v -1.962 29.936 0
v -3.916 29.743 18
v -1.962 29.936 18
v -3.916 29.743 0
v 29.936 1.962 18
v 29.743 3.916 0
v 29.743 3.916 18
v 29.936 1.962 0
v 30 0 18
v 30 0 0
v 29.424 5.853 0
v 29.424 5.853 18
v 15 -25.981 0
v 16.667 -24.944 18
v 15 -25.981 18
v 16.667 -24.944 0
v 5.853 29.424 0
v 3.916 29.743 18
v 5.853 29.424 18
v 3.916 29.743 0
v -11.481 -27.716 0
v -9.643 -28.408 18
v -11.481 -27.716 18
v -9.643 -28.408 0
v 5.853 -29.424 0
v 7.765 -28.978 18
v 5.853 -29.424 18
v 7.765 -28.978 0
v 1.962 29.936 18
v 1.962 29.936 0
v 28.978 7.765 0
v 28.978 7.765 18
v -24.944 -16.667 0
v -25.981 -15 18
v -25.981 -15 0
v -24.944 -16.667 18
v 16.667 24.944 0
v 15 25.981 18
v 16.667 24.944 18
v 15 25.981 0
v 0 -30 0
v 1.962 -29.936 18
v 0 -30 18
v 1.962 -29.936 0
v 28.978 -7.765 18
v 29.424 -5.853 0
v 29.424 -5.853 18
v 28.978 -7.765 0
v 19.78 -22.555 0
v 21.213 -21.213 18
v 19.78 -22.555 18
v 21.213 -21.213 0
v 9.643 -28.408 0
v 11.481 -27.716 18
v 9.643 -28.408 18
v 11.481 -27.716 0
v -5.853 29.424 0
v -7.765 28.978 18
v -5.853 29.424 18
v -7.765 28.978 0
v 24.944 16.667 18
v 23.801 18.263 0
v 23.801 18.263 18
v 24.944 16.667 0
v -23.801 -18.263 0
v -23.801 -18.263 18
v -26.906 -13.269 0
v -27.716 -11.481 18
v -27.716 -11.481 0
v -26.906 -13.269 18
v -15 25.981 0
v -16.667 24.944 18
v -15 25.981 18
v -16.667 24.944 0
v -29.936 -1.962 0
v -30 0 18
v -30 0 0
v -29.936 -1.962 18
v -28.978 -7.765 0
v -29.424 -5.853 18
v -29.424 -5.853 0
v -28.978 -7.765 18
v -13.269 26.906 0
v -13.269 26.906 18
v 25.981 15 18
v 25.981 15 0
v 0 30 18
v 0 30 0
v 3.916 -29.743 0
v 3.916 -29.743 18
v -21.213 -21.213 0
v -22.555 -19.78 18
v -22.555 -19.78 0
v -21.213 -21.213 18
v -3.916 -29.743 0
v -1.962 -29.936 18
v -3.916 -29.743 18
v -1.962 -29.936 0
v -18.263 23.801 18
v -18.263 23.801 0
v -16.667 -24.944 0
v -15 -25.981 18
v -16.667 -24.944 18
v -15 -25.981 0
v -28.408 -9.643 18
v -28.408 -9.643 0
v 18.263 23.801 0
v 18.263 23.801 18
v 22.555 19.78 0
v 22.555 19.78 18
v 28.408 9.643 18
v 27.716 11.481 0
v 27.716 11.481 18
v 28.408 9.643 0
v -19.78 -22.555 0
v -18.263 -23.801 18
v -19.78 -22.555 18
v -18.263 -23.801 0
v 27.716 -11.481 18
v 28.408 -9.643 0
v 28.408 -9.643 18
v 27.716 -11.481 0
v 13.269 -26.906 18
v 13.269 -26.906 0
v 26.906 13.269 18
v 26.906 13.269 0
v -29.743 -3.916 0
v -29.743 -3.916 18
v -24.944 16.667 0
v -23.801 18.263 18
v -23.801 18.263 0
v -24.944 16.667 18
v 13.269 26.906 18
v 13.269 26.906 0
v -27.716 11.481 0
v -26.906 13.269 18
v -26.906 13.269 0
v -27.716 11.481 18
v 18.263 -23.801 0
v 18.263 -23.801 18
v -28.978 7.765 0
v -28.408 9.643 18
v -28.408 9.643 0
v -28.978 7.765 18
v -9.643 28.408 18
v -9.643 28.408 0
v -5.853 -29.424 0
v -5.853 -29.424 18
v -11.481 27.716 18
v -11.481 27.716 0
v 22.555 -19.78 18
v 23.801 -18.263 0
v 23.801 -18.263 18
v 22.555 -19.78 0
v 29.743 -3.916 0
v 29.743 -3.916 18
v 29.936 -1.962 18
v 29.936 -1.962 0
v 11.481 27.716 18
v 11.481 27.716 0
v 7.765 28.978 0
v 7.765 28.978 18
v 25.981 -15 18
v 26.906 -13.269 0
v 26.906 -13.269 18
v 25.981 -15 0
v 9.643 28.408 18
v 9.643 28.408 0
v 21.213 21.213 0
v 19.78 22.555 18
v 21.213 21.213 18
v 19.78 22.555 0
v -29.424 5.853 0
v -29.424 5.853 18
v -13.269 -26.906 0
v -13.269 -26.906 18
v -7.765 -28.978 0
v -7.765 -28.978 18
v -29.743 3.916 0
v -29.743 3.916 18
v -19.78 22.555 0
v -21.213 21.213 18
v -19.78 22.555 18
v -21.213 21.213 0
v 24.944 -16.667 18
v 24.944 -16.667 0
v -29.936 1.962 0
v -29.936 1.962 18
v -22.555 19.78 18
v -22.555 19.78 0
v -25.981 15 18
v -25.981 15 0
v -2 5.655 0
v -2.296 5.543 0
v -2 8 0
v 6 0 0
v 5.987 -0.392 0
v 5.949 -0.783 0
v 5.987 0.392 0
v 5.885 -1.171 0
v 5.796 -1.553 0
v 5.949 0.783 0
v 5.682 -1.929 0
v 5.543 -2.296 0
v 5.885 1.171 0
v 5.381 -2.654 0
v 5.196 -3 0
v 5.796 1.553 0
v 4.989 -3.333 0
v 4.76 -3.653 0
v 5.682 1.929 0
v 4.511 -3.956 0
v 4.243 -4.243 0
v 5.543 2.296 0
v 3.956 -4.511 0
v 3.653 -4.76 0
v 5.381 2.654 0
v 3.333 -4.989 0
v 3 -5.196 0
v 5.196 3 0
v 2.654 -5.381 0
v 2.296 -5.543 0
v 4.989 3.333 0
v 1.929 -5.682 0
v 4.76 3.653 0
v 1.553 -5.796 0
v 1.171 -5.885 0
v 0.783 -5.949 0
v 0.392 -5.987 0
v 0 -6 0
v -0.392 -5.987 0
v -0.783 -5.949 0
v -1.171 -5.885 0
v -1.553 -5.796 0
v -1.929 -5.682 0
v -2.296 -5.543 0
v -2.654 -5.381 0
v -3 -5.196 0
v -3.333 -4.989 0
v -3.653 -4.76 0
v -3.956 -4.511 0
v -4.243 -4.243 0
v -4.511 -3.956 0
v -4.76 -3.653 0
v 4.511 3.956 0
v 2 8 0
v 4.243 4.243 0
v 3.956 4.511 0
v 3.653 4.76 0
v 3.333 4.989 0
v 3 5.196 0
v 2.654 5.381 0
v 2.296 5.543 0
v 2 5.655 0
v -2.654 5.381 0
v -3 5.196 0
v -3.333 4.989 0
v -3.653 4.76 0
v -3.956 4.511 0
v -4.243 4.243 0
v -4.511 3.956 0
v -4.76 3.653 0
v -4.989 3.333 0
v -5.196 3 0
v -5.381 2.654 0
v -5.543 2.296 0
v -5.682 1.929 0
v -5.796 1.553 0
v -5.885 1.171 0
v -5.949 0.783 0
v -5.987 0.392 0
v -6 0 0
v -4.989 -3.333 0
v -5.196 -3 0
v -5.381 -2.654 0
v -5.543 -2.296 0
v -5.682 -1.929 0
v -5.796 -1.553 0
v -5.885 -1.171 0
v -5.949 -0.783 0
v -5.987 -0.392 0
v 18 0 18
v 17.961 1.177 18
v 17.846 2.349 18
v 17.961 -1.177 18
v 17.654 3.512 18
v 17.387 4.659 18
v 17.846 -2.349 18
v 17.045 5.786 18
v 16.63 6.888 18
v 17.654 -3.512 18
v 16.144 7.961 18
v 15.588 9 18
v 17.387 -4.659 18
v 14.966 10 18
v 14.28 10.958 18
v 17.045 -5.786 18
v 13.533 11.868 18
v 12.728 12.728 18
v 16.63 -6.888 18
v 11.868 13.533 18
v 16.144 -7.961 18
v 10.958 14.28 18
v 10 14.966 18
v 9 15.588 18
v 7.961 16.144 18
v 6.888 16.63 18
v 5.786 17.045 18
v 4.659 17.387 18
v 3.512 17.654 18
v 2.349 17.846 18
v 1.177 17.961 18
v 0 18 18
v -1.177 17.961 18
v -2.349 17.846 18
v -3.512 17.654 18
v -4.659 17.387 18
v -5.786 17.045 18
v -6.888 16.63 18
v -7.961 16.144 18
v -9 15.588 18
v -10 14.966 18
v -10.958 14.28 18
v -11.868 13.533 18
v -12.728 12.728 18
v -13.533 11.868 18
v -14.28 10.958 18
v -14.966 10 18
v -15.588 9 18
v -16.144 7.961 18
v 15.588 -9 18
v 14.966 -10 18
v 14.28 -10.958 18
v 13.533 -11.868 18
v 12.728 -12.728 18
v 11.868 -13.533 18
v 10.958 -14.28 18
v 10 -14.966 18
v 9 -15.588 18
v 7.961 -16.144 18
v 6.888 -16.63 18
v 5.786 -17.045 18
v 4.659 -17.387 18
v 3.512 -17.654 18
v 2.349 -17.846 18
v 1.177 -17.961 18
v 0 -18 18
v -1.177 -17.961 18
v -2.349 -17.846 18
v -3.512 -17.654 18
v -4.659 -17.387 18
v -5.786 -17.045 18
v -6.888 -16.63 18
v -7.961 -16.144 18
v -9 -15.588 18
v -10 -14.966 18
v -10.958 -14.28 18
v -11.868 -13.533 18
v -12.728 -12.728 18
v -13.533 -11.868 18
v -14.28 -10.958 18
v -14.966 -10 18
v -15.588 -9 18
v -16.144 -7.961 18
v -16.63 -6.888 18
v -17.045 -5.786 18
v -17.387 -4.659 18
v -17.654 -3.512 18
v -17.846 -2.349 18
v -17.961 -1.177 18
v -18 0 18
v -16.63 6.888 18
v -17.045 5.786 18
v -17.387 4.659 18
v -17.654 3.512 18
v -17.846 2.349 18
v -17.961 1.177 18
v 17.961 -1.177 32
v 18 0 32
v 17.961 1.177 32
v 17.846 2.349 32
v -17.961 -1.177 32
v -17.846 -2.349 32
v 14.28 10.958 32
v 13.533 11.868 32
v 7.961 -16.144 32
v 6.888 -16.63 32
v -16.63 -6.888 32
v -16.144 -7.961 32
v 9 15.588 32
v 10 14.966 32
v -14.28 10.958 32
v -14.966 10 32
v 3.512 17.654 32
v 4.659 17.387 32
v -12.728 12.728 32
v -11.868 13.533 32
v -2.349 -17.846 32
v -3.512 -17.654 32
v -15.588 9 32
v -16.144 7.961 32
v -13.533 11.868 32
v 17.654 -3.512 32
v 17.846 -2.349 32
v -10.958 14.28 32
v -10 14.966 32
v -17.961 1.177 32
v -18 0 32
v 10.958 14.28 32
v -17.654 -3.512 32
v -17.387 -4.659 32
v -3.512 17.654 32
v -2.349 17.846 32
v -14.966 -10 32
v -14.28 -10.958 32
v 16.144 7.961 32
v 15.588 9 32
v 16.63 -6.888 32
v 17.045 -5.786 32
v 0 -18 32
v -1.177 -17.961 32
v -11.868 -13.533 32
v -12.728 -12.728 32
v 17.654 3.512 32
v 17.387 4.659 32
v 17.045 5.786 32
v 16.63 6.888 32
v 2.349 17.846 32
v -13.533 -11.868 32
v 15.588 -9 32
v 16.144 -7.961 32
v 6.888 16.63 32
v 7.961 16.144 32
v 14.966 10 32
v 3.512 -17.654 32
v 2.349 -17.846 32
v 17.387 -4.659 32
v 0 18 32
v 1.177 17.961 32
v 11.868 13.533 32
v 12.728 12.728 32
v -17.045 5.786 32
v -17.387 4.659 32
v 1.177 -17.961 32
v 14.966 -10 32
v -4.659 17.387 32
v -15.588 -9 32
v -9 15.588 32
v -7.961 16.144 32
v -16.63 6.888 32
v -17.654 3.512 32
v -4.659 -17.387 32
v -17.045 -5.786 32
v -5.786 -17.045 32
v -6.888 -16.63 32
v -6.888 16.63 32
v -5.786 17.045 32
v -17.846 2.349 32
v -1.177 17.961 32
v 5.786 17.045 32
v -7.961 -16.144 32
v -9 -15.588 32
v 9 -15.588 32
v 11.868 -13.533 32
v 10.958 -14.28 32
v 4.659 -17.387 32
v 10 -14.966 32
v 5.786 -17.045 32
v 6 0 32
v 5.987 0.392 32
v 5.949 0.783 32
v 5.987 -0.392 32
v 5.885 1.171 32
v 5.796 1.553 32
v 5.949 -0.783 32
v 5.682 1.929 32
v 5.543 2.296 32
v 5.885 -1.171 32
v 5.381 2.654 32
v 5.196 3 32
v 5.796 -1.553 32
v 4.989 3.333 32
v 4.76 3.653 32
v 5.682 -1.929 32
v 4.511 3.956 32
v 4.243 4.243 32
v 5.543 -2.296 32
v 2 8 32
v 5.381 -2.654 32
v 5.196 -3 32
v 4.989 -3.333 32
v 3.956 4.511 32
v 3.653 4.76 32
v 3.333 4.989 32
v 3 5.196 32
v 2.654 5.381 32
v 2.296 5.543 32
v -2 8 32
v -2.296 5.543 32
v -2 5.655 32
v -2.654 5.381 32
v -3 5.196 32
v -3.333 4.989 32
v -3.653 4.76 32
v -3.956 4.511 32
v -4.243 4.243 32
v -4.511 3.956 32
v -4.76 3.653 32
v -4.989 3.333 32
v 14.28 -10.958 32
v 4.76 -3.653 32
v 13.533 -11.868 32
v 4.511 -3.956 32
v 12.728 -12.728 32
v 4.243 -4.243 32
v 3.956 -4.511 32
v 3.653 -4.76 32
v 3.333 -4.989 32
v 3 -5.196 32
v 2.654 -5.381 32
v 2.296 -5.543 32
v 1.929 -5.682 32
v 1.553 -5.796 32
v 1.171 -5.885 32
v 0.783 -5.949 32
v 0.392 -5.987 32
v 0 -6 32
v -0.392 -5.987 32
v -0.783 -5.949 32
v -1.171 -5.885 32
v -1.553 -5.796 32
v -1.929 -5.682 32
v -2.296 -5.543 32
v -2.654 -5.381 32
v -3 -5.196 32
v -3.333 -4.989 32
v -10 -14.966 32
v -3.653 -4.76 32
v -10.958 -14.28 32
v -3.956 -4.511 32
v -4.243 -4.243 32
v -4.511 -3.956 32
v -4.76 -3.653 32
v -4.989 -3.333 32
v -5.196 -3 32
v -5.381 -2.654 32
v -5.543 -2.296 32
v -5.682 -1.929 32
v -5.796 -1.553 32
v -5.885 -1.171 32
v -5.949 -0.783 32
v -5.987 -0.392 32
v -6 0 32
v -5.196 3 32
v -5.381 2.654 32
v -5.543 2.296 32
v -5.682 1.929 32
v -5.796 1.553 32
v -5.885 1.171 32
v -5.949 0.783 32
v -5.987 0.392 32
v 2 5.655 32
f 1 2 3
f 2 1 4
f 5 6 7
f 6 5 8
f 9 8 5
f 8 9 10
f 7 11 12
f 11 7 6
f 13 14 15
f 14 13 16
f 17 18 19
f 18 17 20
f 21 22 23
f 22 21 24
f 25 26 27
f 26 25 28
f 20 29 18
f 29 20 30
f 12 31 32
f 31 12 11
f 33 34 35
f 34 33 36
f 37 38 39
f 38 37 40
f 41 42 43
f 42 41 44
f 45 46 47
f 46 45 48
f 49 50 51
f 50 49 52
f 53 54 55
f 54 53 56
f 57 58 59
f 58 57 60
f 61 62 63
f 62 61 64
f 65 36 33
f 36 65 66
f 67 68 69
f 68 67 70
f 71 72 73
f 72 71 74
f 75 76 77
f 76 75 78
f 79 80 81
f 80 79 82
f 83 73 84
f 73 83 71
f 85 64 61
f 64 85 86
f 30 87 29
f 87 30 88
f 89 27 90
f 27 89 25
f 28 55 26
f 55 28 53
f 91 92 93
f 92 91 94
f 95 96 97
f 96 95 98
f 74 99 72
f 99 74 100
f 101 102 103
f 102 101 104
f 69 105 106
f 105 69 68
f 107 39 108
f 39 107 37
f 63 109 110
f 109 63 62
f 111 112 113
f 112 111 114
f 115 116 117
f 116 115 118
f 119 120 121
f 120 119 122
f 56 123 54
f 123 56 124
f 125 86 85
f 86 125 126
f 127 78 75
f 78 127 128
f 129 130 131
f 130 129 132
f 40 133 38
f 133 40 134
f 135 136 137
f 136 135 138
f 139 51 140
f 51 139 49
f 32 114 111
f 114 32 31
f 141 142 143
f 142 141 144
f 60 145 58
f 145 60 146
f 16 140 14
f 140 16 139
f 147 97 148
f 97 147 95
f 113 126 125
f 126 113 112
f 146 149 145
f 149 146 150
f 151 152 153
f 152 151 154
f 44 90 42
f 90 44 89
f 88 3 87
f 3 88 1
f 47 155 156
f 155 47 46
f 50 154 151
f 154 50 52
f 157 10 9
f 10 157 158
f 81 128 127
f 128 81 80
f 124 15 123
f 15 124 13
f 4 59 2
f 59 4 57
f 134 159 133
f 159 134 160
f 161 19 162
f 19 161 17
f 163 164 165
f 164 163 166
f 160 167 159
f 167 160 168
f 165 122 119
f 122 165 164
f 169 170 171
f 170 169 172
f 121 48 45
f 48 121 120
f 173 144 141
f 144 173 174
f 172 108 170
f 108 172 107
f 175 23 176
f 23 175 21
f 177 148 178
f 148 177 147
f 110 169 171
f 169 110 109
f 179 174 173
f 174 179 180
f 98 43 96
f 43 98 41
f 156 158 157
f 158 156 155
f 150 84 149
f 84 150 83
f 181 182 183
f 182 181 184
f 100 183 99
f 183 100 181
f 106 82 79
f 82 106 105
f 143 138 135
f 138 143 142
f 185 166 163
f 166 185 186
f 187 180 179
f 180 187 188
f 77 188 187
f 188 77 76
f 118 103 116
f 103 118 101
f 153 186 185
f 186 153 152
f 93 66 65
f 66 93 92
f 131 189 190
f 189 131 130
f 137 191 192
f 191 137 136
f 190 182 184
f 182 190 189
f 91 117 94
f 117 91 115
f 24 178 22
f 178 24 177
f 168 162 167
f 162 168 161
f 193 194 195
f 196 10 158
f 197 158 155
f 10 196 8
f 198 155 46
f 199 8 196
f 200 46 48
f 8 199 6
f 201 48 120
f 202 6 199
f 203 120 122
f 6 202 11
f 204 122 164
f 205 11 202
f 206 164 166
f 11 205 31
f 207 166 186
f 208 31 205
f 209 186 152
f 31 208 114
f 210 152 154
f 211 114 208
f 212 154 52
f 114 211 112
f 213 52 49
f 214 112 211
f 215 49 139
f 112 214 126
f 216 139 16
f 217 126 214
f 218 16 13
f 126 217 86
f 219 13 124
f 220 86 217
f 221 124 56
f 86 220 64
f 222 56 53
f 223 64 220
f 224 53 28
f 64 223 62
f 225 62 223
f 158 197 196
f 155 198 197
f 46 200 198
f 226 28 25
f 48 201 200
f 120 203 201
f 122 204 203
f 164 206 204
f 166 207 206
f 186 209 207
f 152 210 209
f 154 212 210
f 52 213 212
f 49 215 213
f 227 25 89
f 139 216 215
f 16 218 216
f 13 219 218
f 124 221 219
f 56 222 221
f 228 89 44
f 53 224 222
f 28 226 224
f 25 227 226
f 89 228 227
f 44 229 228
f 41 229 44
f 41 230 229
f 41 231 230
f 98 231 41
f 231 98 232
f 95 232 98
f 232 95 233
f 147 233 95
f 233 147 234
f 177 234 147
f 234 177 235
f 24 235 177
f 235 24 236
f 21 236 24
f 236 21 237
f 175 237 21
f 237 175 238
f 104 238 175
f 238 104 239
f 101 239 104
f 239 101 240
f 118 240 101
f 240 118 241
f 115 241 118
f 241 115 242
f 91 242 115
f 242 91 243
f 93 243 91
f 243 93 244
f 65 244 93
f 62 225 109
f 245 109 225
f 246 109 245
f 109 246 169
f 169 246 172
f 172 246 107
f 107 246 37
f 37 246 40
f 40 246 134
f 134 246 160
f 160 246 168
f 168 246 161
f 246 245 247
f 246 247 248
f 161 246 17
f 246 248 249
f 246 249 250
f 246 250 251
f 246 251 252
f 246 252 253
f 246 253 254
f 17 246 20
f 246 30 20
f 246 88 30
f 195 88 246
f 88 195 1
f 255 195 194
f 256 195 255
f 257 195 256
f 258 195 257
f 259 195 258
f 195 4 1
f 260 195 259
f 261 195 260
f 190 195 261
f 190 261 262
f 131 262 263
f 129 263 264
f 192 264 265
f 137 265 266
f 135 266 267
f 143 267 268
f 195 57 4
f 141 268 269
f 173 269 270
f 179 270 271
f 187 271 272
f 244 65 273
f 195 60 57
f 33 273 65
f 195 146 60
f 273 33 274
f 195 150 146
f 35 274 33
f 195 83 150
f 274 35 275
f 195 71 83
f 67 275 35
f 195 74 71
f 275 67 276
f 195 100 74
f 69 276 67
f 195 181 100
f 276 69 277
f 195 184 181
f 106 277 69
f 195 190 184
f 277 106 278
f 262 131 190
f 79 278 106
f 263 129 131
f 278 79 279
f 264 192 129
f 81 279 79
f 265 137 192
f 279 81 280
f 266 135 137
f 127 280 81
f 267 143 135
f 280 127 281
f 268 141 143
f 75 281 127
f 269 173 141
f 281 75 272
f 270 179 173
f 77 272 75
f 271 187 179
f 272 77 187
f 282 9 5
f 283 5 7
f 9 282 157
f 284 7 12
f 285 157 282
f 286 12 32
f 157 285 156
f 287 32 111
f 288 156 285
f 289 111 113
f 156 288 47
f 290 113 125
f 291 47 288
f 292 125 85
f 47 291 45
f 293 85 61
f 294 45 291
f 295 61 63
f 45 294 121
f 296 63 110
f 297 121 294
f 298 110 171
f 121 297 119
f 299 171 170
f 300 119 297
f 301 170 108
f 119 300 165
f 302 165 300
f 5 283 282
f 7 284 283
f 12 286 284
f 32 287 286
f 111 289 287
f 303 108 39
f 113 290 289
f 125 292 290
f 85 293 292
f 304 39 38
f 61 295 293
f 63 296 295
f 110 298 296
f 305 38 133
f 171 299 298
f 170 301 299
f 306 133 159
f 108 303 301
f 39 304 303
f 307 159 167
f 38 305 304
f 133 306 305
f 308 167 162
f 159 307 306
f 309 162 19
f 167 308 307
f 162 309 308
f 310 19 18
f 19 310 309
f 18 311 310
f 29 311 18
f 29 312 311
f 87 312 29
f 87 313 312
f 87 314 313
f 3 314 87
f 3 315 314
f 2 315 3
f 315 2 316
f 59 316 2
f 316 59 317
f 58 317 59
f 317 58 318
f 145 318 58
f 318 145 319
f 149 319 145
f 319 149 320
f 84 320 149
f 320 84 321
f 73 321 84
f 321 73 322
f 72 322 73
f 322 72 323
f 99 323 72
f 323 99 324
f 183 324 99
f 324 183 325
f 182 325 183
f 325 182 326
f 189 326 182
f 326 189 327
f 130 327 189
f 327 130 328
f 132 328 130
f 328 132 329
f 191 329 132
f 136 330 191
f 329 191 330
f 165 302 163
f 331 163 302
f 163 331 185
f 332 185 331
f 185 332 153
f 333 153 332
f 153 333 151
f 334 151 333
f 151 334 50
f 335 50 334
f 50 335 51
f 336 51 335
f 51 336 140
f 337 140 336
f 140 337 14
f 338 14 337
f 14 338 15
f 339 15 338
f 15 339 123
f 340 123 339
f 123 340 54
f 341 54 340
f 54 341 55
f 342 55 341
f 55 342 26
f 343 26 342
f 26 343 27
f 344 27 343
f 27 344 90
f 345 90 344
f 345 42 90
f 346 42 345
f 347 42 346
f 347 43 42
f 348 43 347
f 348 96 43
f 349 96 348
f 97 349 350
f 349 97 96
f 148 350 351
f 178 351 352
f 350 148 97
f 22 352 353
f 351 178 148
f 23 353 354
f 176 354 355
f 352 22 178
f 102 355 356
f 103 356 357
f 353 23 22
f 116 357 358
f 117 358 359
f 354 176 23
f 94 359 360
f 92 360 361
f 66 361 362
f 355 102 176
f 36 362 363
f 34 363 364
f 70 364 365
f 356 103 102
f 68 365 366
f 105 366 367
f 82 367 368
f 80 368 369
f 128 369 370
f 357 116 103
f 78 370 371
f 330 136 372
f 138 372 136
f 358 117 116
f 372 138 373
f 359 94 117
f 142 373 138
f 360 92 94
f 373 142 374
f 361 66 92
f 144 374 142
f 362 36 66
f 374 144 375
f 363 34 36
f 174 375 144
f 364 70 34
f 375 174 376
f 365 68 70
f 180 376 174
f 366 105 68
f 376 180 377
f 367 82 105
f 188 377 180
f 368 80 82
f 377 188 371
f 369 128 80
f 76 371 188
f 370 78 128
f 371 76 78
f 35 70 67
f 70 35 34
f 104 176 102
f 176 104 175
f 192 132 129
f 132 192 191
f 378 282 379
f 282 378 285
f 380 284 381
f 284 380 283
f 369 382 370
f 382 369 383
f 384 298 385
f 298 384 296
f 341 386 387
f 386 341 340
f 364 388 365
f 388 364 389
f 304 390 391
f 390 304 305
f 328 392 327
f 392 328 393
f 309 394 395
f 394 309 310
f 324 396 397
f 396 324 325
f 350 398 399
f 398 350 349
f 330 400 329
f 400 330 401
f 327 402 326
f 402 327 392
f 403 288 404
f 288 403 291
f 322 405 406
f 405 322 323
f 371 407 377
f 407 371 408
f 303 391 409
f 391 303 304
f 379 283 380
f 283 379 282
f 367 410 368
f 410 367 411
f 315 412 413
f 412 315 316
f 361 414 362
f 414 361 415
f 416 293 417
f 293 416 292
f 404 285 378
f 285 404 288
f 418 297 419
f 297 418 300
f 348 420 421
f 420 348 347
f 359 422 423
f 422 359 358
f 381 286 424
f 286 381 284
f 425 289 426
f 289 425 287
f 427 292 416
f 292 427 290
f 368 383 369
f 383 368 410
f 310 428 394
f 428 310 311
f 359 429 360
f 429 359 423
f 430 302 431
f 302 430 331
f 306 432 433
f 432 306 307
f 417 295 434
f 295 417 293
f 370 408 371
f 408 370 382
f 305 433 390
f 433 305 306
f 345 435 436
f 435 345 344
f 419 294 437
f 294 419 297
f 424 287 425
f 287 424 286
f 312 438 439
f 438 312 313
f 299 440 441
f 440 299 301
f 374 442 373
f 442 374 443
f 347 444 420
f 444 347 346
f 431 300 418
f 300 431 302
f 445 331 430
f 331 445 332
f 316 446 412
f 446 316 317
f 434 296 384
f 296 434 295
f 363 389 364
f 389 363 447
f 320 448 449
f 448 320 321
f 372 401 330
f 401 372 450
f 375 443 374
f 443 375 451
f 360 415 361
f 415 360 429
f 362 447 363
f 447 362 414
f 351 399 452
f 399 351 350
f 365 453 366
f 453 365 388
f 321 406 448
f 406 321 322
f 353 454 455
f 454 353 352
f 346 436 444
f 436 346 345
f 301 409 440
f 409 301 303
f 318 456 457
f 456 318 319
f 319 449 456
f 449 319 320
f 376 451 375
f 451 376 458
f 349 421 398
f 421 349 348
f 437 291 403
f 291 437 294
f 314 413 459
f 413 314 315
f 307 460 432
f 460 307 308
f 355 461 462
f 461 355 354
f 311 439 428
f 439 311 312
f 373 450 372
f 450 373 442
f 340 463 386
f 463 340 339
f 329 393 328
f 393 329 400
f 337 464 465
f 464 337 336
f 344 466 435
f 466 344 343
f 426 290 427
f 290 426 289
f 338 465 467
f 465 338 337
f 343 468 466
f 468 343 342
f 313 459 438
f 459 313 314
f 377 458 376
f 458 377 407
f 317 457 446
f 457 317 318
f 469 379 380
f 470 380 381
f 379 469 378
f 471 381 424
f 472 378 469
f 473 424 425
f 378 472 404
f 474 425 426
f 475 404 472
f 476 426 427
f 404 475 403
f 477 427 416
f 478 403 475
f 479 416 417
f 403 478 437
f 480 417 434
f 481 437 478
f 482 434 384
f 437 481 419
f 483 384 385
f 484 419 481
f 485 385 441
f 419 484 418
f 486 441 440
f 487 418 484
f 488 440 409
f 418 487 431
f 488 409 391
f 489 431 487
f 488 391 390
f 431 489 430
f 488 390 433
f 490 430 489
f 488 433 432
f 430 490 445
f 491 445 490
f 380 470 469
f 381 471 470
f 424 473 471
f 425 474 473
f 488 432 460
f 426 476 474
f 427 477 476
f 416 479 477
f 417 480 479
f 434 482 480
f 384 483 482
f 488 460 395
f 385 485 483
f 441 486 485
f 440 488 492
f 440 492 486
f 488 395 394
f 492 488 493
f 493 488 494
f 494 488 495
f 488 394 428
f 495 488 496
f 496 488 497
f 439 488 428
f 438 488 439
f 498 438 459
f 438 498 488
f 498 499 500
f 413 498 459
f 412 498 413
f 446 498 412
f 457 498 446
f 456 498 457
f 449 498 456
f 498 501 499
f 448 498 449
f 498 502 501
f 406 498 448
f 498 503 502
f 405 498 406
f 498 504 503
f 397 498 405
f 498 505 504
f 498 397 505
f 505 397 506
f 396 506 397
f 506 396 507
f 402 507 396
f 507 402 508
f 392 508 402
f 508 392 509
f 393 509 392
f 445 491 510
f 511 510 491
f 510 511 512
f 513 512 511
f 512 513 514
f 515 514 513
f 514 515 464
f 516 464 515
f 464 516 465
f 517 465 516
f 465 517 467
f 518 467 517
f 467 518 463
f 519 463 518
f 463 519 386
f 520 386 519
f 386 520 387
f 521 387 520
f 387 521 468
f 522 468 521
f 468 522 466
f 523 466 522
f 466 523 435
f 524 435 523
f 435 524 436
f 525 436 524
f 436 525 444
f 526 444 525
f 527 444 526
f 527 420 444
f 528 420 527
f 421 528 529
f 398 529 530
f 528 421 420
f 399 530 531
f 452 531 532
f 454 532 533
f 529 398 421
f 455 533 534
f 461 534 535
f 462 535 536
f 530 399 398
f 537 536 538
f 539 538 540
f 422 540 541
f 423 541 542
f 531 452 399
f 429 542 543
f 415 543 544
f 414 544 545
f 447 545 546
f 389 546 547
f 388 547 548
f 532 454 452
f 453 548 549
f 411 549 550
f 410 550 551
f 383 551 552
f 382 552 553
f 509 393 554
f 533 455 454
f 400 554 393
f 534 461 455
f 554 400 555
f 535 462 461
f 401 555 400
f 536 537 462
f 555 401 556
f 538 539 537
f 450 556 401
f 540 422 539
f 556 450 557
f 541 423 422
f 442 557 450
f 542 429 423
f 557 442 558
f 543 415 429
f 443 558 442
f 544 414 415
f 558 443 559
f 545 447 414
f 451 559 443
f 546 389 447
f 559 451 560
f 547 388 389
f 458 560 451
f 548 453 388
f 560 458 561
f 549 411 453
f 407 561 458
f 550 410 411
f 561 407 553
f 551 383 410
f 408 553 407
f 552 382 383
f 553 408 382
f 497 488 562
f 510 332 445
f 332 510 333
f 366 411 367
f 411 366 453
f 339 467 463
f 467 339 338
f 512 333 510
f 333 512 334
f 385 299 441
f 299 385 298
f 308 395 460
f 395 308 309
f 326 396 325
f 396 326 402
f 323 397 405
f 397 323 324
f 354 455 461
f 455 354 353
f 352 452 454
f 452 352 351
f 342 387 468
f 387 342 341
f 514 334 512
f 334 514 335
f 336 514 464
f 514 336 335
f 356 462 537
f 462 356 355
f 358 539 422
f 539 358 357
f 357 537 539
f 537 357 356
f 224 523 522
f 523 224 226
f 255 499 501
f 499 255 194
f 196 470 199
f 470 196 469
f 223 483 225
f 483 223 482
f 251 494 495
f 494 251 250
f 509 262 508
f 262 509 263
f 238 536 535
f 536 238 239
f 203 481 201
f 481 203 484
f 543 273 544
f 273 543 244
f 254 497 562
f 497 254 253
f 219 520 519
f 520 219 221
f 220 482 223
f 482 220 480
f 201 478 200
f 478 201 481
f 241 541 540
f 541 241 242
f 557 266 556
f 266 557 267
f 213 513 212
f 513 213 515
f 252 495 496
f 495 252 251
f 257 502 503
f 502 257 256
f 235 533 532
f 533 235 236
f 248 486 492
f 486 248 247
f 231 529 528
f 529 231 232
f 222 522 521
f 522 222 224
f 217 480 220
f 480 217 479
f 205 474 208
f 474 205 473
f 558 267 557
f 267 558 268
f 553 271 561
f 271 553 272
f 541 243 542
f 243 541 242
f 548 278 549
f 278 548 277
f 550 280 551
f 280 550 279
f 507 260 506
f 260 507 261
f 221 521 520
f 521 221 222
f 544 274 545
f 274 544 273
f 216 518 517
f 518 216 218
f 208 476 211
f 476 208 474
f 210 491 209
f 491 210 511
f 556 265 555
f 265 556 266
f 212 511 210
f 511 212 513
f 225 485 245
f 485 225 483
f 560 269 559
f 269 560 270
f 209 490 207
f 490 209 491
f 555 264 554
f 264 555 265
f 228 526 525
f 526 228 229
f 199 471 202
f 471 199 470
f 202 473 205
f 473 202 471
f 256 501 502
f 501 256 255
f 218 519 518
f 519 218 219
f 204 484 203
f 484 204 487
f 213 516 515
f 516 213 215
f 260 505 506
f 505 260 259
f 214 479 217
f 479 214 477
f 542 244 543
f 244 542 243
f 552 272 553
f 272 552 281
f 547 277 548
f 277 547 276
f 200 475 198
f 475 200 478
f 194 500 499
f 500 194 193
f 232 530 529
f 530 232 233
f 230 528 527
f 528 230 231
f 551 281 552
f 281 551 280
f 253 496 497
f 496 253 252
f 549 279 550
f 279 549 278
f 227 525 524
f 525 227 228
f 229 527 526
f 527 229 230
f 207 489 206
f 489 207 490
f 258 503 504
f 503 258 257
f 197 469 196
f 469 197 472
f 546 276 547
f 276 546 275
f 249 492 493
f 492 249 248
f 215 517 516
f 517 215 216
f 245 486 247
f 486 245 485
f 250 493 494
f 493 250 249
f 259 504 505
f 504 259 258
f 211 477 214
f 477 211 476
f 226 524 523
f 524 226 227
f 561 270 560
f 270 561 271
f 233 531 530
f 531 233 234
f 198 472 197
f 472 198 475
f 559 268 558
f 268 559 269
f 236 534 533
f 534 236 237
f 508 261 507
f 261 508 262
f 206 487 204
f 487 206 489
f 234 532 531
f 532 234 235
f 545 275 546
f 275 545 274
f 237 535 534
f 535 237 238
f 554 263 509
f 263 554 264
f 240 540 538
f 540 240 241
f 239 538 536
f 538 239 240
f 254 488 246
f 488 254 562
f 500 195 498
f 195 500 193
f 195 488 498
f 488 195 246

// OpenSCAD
// t3-004 stepped pulley with keyed bore
$fn = 96;
large_diameter = 60;
large_height = 18;
small_diameter = 36;
small_height = 14;
bore_diameter = 12;
keyway_width = 4;
keyway_depth_from_axis = 8;
total_height = large_height + small_height;

difference() {
    union() {
        cylinder(d = large_diameter, h = large_height);
        translate([0, 0, large_height - 0.01])
            cylinder(d = small_diameter, h = small_height + 0.01);
    }
    translate([0, 0, -1]) cylinder(d = bore_diameter, h = total_height + 2);
    translate([-keyway_width / 2, 0, -1])
        cube([keyway_width, keyway_depth_from_axis, total_height + 2]);
}
